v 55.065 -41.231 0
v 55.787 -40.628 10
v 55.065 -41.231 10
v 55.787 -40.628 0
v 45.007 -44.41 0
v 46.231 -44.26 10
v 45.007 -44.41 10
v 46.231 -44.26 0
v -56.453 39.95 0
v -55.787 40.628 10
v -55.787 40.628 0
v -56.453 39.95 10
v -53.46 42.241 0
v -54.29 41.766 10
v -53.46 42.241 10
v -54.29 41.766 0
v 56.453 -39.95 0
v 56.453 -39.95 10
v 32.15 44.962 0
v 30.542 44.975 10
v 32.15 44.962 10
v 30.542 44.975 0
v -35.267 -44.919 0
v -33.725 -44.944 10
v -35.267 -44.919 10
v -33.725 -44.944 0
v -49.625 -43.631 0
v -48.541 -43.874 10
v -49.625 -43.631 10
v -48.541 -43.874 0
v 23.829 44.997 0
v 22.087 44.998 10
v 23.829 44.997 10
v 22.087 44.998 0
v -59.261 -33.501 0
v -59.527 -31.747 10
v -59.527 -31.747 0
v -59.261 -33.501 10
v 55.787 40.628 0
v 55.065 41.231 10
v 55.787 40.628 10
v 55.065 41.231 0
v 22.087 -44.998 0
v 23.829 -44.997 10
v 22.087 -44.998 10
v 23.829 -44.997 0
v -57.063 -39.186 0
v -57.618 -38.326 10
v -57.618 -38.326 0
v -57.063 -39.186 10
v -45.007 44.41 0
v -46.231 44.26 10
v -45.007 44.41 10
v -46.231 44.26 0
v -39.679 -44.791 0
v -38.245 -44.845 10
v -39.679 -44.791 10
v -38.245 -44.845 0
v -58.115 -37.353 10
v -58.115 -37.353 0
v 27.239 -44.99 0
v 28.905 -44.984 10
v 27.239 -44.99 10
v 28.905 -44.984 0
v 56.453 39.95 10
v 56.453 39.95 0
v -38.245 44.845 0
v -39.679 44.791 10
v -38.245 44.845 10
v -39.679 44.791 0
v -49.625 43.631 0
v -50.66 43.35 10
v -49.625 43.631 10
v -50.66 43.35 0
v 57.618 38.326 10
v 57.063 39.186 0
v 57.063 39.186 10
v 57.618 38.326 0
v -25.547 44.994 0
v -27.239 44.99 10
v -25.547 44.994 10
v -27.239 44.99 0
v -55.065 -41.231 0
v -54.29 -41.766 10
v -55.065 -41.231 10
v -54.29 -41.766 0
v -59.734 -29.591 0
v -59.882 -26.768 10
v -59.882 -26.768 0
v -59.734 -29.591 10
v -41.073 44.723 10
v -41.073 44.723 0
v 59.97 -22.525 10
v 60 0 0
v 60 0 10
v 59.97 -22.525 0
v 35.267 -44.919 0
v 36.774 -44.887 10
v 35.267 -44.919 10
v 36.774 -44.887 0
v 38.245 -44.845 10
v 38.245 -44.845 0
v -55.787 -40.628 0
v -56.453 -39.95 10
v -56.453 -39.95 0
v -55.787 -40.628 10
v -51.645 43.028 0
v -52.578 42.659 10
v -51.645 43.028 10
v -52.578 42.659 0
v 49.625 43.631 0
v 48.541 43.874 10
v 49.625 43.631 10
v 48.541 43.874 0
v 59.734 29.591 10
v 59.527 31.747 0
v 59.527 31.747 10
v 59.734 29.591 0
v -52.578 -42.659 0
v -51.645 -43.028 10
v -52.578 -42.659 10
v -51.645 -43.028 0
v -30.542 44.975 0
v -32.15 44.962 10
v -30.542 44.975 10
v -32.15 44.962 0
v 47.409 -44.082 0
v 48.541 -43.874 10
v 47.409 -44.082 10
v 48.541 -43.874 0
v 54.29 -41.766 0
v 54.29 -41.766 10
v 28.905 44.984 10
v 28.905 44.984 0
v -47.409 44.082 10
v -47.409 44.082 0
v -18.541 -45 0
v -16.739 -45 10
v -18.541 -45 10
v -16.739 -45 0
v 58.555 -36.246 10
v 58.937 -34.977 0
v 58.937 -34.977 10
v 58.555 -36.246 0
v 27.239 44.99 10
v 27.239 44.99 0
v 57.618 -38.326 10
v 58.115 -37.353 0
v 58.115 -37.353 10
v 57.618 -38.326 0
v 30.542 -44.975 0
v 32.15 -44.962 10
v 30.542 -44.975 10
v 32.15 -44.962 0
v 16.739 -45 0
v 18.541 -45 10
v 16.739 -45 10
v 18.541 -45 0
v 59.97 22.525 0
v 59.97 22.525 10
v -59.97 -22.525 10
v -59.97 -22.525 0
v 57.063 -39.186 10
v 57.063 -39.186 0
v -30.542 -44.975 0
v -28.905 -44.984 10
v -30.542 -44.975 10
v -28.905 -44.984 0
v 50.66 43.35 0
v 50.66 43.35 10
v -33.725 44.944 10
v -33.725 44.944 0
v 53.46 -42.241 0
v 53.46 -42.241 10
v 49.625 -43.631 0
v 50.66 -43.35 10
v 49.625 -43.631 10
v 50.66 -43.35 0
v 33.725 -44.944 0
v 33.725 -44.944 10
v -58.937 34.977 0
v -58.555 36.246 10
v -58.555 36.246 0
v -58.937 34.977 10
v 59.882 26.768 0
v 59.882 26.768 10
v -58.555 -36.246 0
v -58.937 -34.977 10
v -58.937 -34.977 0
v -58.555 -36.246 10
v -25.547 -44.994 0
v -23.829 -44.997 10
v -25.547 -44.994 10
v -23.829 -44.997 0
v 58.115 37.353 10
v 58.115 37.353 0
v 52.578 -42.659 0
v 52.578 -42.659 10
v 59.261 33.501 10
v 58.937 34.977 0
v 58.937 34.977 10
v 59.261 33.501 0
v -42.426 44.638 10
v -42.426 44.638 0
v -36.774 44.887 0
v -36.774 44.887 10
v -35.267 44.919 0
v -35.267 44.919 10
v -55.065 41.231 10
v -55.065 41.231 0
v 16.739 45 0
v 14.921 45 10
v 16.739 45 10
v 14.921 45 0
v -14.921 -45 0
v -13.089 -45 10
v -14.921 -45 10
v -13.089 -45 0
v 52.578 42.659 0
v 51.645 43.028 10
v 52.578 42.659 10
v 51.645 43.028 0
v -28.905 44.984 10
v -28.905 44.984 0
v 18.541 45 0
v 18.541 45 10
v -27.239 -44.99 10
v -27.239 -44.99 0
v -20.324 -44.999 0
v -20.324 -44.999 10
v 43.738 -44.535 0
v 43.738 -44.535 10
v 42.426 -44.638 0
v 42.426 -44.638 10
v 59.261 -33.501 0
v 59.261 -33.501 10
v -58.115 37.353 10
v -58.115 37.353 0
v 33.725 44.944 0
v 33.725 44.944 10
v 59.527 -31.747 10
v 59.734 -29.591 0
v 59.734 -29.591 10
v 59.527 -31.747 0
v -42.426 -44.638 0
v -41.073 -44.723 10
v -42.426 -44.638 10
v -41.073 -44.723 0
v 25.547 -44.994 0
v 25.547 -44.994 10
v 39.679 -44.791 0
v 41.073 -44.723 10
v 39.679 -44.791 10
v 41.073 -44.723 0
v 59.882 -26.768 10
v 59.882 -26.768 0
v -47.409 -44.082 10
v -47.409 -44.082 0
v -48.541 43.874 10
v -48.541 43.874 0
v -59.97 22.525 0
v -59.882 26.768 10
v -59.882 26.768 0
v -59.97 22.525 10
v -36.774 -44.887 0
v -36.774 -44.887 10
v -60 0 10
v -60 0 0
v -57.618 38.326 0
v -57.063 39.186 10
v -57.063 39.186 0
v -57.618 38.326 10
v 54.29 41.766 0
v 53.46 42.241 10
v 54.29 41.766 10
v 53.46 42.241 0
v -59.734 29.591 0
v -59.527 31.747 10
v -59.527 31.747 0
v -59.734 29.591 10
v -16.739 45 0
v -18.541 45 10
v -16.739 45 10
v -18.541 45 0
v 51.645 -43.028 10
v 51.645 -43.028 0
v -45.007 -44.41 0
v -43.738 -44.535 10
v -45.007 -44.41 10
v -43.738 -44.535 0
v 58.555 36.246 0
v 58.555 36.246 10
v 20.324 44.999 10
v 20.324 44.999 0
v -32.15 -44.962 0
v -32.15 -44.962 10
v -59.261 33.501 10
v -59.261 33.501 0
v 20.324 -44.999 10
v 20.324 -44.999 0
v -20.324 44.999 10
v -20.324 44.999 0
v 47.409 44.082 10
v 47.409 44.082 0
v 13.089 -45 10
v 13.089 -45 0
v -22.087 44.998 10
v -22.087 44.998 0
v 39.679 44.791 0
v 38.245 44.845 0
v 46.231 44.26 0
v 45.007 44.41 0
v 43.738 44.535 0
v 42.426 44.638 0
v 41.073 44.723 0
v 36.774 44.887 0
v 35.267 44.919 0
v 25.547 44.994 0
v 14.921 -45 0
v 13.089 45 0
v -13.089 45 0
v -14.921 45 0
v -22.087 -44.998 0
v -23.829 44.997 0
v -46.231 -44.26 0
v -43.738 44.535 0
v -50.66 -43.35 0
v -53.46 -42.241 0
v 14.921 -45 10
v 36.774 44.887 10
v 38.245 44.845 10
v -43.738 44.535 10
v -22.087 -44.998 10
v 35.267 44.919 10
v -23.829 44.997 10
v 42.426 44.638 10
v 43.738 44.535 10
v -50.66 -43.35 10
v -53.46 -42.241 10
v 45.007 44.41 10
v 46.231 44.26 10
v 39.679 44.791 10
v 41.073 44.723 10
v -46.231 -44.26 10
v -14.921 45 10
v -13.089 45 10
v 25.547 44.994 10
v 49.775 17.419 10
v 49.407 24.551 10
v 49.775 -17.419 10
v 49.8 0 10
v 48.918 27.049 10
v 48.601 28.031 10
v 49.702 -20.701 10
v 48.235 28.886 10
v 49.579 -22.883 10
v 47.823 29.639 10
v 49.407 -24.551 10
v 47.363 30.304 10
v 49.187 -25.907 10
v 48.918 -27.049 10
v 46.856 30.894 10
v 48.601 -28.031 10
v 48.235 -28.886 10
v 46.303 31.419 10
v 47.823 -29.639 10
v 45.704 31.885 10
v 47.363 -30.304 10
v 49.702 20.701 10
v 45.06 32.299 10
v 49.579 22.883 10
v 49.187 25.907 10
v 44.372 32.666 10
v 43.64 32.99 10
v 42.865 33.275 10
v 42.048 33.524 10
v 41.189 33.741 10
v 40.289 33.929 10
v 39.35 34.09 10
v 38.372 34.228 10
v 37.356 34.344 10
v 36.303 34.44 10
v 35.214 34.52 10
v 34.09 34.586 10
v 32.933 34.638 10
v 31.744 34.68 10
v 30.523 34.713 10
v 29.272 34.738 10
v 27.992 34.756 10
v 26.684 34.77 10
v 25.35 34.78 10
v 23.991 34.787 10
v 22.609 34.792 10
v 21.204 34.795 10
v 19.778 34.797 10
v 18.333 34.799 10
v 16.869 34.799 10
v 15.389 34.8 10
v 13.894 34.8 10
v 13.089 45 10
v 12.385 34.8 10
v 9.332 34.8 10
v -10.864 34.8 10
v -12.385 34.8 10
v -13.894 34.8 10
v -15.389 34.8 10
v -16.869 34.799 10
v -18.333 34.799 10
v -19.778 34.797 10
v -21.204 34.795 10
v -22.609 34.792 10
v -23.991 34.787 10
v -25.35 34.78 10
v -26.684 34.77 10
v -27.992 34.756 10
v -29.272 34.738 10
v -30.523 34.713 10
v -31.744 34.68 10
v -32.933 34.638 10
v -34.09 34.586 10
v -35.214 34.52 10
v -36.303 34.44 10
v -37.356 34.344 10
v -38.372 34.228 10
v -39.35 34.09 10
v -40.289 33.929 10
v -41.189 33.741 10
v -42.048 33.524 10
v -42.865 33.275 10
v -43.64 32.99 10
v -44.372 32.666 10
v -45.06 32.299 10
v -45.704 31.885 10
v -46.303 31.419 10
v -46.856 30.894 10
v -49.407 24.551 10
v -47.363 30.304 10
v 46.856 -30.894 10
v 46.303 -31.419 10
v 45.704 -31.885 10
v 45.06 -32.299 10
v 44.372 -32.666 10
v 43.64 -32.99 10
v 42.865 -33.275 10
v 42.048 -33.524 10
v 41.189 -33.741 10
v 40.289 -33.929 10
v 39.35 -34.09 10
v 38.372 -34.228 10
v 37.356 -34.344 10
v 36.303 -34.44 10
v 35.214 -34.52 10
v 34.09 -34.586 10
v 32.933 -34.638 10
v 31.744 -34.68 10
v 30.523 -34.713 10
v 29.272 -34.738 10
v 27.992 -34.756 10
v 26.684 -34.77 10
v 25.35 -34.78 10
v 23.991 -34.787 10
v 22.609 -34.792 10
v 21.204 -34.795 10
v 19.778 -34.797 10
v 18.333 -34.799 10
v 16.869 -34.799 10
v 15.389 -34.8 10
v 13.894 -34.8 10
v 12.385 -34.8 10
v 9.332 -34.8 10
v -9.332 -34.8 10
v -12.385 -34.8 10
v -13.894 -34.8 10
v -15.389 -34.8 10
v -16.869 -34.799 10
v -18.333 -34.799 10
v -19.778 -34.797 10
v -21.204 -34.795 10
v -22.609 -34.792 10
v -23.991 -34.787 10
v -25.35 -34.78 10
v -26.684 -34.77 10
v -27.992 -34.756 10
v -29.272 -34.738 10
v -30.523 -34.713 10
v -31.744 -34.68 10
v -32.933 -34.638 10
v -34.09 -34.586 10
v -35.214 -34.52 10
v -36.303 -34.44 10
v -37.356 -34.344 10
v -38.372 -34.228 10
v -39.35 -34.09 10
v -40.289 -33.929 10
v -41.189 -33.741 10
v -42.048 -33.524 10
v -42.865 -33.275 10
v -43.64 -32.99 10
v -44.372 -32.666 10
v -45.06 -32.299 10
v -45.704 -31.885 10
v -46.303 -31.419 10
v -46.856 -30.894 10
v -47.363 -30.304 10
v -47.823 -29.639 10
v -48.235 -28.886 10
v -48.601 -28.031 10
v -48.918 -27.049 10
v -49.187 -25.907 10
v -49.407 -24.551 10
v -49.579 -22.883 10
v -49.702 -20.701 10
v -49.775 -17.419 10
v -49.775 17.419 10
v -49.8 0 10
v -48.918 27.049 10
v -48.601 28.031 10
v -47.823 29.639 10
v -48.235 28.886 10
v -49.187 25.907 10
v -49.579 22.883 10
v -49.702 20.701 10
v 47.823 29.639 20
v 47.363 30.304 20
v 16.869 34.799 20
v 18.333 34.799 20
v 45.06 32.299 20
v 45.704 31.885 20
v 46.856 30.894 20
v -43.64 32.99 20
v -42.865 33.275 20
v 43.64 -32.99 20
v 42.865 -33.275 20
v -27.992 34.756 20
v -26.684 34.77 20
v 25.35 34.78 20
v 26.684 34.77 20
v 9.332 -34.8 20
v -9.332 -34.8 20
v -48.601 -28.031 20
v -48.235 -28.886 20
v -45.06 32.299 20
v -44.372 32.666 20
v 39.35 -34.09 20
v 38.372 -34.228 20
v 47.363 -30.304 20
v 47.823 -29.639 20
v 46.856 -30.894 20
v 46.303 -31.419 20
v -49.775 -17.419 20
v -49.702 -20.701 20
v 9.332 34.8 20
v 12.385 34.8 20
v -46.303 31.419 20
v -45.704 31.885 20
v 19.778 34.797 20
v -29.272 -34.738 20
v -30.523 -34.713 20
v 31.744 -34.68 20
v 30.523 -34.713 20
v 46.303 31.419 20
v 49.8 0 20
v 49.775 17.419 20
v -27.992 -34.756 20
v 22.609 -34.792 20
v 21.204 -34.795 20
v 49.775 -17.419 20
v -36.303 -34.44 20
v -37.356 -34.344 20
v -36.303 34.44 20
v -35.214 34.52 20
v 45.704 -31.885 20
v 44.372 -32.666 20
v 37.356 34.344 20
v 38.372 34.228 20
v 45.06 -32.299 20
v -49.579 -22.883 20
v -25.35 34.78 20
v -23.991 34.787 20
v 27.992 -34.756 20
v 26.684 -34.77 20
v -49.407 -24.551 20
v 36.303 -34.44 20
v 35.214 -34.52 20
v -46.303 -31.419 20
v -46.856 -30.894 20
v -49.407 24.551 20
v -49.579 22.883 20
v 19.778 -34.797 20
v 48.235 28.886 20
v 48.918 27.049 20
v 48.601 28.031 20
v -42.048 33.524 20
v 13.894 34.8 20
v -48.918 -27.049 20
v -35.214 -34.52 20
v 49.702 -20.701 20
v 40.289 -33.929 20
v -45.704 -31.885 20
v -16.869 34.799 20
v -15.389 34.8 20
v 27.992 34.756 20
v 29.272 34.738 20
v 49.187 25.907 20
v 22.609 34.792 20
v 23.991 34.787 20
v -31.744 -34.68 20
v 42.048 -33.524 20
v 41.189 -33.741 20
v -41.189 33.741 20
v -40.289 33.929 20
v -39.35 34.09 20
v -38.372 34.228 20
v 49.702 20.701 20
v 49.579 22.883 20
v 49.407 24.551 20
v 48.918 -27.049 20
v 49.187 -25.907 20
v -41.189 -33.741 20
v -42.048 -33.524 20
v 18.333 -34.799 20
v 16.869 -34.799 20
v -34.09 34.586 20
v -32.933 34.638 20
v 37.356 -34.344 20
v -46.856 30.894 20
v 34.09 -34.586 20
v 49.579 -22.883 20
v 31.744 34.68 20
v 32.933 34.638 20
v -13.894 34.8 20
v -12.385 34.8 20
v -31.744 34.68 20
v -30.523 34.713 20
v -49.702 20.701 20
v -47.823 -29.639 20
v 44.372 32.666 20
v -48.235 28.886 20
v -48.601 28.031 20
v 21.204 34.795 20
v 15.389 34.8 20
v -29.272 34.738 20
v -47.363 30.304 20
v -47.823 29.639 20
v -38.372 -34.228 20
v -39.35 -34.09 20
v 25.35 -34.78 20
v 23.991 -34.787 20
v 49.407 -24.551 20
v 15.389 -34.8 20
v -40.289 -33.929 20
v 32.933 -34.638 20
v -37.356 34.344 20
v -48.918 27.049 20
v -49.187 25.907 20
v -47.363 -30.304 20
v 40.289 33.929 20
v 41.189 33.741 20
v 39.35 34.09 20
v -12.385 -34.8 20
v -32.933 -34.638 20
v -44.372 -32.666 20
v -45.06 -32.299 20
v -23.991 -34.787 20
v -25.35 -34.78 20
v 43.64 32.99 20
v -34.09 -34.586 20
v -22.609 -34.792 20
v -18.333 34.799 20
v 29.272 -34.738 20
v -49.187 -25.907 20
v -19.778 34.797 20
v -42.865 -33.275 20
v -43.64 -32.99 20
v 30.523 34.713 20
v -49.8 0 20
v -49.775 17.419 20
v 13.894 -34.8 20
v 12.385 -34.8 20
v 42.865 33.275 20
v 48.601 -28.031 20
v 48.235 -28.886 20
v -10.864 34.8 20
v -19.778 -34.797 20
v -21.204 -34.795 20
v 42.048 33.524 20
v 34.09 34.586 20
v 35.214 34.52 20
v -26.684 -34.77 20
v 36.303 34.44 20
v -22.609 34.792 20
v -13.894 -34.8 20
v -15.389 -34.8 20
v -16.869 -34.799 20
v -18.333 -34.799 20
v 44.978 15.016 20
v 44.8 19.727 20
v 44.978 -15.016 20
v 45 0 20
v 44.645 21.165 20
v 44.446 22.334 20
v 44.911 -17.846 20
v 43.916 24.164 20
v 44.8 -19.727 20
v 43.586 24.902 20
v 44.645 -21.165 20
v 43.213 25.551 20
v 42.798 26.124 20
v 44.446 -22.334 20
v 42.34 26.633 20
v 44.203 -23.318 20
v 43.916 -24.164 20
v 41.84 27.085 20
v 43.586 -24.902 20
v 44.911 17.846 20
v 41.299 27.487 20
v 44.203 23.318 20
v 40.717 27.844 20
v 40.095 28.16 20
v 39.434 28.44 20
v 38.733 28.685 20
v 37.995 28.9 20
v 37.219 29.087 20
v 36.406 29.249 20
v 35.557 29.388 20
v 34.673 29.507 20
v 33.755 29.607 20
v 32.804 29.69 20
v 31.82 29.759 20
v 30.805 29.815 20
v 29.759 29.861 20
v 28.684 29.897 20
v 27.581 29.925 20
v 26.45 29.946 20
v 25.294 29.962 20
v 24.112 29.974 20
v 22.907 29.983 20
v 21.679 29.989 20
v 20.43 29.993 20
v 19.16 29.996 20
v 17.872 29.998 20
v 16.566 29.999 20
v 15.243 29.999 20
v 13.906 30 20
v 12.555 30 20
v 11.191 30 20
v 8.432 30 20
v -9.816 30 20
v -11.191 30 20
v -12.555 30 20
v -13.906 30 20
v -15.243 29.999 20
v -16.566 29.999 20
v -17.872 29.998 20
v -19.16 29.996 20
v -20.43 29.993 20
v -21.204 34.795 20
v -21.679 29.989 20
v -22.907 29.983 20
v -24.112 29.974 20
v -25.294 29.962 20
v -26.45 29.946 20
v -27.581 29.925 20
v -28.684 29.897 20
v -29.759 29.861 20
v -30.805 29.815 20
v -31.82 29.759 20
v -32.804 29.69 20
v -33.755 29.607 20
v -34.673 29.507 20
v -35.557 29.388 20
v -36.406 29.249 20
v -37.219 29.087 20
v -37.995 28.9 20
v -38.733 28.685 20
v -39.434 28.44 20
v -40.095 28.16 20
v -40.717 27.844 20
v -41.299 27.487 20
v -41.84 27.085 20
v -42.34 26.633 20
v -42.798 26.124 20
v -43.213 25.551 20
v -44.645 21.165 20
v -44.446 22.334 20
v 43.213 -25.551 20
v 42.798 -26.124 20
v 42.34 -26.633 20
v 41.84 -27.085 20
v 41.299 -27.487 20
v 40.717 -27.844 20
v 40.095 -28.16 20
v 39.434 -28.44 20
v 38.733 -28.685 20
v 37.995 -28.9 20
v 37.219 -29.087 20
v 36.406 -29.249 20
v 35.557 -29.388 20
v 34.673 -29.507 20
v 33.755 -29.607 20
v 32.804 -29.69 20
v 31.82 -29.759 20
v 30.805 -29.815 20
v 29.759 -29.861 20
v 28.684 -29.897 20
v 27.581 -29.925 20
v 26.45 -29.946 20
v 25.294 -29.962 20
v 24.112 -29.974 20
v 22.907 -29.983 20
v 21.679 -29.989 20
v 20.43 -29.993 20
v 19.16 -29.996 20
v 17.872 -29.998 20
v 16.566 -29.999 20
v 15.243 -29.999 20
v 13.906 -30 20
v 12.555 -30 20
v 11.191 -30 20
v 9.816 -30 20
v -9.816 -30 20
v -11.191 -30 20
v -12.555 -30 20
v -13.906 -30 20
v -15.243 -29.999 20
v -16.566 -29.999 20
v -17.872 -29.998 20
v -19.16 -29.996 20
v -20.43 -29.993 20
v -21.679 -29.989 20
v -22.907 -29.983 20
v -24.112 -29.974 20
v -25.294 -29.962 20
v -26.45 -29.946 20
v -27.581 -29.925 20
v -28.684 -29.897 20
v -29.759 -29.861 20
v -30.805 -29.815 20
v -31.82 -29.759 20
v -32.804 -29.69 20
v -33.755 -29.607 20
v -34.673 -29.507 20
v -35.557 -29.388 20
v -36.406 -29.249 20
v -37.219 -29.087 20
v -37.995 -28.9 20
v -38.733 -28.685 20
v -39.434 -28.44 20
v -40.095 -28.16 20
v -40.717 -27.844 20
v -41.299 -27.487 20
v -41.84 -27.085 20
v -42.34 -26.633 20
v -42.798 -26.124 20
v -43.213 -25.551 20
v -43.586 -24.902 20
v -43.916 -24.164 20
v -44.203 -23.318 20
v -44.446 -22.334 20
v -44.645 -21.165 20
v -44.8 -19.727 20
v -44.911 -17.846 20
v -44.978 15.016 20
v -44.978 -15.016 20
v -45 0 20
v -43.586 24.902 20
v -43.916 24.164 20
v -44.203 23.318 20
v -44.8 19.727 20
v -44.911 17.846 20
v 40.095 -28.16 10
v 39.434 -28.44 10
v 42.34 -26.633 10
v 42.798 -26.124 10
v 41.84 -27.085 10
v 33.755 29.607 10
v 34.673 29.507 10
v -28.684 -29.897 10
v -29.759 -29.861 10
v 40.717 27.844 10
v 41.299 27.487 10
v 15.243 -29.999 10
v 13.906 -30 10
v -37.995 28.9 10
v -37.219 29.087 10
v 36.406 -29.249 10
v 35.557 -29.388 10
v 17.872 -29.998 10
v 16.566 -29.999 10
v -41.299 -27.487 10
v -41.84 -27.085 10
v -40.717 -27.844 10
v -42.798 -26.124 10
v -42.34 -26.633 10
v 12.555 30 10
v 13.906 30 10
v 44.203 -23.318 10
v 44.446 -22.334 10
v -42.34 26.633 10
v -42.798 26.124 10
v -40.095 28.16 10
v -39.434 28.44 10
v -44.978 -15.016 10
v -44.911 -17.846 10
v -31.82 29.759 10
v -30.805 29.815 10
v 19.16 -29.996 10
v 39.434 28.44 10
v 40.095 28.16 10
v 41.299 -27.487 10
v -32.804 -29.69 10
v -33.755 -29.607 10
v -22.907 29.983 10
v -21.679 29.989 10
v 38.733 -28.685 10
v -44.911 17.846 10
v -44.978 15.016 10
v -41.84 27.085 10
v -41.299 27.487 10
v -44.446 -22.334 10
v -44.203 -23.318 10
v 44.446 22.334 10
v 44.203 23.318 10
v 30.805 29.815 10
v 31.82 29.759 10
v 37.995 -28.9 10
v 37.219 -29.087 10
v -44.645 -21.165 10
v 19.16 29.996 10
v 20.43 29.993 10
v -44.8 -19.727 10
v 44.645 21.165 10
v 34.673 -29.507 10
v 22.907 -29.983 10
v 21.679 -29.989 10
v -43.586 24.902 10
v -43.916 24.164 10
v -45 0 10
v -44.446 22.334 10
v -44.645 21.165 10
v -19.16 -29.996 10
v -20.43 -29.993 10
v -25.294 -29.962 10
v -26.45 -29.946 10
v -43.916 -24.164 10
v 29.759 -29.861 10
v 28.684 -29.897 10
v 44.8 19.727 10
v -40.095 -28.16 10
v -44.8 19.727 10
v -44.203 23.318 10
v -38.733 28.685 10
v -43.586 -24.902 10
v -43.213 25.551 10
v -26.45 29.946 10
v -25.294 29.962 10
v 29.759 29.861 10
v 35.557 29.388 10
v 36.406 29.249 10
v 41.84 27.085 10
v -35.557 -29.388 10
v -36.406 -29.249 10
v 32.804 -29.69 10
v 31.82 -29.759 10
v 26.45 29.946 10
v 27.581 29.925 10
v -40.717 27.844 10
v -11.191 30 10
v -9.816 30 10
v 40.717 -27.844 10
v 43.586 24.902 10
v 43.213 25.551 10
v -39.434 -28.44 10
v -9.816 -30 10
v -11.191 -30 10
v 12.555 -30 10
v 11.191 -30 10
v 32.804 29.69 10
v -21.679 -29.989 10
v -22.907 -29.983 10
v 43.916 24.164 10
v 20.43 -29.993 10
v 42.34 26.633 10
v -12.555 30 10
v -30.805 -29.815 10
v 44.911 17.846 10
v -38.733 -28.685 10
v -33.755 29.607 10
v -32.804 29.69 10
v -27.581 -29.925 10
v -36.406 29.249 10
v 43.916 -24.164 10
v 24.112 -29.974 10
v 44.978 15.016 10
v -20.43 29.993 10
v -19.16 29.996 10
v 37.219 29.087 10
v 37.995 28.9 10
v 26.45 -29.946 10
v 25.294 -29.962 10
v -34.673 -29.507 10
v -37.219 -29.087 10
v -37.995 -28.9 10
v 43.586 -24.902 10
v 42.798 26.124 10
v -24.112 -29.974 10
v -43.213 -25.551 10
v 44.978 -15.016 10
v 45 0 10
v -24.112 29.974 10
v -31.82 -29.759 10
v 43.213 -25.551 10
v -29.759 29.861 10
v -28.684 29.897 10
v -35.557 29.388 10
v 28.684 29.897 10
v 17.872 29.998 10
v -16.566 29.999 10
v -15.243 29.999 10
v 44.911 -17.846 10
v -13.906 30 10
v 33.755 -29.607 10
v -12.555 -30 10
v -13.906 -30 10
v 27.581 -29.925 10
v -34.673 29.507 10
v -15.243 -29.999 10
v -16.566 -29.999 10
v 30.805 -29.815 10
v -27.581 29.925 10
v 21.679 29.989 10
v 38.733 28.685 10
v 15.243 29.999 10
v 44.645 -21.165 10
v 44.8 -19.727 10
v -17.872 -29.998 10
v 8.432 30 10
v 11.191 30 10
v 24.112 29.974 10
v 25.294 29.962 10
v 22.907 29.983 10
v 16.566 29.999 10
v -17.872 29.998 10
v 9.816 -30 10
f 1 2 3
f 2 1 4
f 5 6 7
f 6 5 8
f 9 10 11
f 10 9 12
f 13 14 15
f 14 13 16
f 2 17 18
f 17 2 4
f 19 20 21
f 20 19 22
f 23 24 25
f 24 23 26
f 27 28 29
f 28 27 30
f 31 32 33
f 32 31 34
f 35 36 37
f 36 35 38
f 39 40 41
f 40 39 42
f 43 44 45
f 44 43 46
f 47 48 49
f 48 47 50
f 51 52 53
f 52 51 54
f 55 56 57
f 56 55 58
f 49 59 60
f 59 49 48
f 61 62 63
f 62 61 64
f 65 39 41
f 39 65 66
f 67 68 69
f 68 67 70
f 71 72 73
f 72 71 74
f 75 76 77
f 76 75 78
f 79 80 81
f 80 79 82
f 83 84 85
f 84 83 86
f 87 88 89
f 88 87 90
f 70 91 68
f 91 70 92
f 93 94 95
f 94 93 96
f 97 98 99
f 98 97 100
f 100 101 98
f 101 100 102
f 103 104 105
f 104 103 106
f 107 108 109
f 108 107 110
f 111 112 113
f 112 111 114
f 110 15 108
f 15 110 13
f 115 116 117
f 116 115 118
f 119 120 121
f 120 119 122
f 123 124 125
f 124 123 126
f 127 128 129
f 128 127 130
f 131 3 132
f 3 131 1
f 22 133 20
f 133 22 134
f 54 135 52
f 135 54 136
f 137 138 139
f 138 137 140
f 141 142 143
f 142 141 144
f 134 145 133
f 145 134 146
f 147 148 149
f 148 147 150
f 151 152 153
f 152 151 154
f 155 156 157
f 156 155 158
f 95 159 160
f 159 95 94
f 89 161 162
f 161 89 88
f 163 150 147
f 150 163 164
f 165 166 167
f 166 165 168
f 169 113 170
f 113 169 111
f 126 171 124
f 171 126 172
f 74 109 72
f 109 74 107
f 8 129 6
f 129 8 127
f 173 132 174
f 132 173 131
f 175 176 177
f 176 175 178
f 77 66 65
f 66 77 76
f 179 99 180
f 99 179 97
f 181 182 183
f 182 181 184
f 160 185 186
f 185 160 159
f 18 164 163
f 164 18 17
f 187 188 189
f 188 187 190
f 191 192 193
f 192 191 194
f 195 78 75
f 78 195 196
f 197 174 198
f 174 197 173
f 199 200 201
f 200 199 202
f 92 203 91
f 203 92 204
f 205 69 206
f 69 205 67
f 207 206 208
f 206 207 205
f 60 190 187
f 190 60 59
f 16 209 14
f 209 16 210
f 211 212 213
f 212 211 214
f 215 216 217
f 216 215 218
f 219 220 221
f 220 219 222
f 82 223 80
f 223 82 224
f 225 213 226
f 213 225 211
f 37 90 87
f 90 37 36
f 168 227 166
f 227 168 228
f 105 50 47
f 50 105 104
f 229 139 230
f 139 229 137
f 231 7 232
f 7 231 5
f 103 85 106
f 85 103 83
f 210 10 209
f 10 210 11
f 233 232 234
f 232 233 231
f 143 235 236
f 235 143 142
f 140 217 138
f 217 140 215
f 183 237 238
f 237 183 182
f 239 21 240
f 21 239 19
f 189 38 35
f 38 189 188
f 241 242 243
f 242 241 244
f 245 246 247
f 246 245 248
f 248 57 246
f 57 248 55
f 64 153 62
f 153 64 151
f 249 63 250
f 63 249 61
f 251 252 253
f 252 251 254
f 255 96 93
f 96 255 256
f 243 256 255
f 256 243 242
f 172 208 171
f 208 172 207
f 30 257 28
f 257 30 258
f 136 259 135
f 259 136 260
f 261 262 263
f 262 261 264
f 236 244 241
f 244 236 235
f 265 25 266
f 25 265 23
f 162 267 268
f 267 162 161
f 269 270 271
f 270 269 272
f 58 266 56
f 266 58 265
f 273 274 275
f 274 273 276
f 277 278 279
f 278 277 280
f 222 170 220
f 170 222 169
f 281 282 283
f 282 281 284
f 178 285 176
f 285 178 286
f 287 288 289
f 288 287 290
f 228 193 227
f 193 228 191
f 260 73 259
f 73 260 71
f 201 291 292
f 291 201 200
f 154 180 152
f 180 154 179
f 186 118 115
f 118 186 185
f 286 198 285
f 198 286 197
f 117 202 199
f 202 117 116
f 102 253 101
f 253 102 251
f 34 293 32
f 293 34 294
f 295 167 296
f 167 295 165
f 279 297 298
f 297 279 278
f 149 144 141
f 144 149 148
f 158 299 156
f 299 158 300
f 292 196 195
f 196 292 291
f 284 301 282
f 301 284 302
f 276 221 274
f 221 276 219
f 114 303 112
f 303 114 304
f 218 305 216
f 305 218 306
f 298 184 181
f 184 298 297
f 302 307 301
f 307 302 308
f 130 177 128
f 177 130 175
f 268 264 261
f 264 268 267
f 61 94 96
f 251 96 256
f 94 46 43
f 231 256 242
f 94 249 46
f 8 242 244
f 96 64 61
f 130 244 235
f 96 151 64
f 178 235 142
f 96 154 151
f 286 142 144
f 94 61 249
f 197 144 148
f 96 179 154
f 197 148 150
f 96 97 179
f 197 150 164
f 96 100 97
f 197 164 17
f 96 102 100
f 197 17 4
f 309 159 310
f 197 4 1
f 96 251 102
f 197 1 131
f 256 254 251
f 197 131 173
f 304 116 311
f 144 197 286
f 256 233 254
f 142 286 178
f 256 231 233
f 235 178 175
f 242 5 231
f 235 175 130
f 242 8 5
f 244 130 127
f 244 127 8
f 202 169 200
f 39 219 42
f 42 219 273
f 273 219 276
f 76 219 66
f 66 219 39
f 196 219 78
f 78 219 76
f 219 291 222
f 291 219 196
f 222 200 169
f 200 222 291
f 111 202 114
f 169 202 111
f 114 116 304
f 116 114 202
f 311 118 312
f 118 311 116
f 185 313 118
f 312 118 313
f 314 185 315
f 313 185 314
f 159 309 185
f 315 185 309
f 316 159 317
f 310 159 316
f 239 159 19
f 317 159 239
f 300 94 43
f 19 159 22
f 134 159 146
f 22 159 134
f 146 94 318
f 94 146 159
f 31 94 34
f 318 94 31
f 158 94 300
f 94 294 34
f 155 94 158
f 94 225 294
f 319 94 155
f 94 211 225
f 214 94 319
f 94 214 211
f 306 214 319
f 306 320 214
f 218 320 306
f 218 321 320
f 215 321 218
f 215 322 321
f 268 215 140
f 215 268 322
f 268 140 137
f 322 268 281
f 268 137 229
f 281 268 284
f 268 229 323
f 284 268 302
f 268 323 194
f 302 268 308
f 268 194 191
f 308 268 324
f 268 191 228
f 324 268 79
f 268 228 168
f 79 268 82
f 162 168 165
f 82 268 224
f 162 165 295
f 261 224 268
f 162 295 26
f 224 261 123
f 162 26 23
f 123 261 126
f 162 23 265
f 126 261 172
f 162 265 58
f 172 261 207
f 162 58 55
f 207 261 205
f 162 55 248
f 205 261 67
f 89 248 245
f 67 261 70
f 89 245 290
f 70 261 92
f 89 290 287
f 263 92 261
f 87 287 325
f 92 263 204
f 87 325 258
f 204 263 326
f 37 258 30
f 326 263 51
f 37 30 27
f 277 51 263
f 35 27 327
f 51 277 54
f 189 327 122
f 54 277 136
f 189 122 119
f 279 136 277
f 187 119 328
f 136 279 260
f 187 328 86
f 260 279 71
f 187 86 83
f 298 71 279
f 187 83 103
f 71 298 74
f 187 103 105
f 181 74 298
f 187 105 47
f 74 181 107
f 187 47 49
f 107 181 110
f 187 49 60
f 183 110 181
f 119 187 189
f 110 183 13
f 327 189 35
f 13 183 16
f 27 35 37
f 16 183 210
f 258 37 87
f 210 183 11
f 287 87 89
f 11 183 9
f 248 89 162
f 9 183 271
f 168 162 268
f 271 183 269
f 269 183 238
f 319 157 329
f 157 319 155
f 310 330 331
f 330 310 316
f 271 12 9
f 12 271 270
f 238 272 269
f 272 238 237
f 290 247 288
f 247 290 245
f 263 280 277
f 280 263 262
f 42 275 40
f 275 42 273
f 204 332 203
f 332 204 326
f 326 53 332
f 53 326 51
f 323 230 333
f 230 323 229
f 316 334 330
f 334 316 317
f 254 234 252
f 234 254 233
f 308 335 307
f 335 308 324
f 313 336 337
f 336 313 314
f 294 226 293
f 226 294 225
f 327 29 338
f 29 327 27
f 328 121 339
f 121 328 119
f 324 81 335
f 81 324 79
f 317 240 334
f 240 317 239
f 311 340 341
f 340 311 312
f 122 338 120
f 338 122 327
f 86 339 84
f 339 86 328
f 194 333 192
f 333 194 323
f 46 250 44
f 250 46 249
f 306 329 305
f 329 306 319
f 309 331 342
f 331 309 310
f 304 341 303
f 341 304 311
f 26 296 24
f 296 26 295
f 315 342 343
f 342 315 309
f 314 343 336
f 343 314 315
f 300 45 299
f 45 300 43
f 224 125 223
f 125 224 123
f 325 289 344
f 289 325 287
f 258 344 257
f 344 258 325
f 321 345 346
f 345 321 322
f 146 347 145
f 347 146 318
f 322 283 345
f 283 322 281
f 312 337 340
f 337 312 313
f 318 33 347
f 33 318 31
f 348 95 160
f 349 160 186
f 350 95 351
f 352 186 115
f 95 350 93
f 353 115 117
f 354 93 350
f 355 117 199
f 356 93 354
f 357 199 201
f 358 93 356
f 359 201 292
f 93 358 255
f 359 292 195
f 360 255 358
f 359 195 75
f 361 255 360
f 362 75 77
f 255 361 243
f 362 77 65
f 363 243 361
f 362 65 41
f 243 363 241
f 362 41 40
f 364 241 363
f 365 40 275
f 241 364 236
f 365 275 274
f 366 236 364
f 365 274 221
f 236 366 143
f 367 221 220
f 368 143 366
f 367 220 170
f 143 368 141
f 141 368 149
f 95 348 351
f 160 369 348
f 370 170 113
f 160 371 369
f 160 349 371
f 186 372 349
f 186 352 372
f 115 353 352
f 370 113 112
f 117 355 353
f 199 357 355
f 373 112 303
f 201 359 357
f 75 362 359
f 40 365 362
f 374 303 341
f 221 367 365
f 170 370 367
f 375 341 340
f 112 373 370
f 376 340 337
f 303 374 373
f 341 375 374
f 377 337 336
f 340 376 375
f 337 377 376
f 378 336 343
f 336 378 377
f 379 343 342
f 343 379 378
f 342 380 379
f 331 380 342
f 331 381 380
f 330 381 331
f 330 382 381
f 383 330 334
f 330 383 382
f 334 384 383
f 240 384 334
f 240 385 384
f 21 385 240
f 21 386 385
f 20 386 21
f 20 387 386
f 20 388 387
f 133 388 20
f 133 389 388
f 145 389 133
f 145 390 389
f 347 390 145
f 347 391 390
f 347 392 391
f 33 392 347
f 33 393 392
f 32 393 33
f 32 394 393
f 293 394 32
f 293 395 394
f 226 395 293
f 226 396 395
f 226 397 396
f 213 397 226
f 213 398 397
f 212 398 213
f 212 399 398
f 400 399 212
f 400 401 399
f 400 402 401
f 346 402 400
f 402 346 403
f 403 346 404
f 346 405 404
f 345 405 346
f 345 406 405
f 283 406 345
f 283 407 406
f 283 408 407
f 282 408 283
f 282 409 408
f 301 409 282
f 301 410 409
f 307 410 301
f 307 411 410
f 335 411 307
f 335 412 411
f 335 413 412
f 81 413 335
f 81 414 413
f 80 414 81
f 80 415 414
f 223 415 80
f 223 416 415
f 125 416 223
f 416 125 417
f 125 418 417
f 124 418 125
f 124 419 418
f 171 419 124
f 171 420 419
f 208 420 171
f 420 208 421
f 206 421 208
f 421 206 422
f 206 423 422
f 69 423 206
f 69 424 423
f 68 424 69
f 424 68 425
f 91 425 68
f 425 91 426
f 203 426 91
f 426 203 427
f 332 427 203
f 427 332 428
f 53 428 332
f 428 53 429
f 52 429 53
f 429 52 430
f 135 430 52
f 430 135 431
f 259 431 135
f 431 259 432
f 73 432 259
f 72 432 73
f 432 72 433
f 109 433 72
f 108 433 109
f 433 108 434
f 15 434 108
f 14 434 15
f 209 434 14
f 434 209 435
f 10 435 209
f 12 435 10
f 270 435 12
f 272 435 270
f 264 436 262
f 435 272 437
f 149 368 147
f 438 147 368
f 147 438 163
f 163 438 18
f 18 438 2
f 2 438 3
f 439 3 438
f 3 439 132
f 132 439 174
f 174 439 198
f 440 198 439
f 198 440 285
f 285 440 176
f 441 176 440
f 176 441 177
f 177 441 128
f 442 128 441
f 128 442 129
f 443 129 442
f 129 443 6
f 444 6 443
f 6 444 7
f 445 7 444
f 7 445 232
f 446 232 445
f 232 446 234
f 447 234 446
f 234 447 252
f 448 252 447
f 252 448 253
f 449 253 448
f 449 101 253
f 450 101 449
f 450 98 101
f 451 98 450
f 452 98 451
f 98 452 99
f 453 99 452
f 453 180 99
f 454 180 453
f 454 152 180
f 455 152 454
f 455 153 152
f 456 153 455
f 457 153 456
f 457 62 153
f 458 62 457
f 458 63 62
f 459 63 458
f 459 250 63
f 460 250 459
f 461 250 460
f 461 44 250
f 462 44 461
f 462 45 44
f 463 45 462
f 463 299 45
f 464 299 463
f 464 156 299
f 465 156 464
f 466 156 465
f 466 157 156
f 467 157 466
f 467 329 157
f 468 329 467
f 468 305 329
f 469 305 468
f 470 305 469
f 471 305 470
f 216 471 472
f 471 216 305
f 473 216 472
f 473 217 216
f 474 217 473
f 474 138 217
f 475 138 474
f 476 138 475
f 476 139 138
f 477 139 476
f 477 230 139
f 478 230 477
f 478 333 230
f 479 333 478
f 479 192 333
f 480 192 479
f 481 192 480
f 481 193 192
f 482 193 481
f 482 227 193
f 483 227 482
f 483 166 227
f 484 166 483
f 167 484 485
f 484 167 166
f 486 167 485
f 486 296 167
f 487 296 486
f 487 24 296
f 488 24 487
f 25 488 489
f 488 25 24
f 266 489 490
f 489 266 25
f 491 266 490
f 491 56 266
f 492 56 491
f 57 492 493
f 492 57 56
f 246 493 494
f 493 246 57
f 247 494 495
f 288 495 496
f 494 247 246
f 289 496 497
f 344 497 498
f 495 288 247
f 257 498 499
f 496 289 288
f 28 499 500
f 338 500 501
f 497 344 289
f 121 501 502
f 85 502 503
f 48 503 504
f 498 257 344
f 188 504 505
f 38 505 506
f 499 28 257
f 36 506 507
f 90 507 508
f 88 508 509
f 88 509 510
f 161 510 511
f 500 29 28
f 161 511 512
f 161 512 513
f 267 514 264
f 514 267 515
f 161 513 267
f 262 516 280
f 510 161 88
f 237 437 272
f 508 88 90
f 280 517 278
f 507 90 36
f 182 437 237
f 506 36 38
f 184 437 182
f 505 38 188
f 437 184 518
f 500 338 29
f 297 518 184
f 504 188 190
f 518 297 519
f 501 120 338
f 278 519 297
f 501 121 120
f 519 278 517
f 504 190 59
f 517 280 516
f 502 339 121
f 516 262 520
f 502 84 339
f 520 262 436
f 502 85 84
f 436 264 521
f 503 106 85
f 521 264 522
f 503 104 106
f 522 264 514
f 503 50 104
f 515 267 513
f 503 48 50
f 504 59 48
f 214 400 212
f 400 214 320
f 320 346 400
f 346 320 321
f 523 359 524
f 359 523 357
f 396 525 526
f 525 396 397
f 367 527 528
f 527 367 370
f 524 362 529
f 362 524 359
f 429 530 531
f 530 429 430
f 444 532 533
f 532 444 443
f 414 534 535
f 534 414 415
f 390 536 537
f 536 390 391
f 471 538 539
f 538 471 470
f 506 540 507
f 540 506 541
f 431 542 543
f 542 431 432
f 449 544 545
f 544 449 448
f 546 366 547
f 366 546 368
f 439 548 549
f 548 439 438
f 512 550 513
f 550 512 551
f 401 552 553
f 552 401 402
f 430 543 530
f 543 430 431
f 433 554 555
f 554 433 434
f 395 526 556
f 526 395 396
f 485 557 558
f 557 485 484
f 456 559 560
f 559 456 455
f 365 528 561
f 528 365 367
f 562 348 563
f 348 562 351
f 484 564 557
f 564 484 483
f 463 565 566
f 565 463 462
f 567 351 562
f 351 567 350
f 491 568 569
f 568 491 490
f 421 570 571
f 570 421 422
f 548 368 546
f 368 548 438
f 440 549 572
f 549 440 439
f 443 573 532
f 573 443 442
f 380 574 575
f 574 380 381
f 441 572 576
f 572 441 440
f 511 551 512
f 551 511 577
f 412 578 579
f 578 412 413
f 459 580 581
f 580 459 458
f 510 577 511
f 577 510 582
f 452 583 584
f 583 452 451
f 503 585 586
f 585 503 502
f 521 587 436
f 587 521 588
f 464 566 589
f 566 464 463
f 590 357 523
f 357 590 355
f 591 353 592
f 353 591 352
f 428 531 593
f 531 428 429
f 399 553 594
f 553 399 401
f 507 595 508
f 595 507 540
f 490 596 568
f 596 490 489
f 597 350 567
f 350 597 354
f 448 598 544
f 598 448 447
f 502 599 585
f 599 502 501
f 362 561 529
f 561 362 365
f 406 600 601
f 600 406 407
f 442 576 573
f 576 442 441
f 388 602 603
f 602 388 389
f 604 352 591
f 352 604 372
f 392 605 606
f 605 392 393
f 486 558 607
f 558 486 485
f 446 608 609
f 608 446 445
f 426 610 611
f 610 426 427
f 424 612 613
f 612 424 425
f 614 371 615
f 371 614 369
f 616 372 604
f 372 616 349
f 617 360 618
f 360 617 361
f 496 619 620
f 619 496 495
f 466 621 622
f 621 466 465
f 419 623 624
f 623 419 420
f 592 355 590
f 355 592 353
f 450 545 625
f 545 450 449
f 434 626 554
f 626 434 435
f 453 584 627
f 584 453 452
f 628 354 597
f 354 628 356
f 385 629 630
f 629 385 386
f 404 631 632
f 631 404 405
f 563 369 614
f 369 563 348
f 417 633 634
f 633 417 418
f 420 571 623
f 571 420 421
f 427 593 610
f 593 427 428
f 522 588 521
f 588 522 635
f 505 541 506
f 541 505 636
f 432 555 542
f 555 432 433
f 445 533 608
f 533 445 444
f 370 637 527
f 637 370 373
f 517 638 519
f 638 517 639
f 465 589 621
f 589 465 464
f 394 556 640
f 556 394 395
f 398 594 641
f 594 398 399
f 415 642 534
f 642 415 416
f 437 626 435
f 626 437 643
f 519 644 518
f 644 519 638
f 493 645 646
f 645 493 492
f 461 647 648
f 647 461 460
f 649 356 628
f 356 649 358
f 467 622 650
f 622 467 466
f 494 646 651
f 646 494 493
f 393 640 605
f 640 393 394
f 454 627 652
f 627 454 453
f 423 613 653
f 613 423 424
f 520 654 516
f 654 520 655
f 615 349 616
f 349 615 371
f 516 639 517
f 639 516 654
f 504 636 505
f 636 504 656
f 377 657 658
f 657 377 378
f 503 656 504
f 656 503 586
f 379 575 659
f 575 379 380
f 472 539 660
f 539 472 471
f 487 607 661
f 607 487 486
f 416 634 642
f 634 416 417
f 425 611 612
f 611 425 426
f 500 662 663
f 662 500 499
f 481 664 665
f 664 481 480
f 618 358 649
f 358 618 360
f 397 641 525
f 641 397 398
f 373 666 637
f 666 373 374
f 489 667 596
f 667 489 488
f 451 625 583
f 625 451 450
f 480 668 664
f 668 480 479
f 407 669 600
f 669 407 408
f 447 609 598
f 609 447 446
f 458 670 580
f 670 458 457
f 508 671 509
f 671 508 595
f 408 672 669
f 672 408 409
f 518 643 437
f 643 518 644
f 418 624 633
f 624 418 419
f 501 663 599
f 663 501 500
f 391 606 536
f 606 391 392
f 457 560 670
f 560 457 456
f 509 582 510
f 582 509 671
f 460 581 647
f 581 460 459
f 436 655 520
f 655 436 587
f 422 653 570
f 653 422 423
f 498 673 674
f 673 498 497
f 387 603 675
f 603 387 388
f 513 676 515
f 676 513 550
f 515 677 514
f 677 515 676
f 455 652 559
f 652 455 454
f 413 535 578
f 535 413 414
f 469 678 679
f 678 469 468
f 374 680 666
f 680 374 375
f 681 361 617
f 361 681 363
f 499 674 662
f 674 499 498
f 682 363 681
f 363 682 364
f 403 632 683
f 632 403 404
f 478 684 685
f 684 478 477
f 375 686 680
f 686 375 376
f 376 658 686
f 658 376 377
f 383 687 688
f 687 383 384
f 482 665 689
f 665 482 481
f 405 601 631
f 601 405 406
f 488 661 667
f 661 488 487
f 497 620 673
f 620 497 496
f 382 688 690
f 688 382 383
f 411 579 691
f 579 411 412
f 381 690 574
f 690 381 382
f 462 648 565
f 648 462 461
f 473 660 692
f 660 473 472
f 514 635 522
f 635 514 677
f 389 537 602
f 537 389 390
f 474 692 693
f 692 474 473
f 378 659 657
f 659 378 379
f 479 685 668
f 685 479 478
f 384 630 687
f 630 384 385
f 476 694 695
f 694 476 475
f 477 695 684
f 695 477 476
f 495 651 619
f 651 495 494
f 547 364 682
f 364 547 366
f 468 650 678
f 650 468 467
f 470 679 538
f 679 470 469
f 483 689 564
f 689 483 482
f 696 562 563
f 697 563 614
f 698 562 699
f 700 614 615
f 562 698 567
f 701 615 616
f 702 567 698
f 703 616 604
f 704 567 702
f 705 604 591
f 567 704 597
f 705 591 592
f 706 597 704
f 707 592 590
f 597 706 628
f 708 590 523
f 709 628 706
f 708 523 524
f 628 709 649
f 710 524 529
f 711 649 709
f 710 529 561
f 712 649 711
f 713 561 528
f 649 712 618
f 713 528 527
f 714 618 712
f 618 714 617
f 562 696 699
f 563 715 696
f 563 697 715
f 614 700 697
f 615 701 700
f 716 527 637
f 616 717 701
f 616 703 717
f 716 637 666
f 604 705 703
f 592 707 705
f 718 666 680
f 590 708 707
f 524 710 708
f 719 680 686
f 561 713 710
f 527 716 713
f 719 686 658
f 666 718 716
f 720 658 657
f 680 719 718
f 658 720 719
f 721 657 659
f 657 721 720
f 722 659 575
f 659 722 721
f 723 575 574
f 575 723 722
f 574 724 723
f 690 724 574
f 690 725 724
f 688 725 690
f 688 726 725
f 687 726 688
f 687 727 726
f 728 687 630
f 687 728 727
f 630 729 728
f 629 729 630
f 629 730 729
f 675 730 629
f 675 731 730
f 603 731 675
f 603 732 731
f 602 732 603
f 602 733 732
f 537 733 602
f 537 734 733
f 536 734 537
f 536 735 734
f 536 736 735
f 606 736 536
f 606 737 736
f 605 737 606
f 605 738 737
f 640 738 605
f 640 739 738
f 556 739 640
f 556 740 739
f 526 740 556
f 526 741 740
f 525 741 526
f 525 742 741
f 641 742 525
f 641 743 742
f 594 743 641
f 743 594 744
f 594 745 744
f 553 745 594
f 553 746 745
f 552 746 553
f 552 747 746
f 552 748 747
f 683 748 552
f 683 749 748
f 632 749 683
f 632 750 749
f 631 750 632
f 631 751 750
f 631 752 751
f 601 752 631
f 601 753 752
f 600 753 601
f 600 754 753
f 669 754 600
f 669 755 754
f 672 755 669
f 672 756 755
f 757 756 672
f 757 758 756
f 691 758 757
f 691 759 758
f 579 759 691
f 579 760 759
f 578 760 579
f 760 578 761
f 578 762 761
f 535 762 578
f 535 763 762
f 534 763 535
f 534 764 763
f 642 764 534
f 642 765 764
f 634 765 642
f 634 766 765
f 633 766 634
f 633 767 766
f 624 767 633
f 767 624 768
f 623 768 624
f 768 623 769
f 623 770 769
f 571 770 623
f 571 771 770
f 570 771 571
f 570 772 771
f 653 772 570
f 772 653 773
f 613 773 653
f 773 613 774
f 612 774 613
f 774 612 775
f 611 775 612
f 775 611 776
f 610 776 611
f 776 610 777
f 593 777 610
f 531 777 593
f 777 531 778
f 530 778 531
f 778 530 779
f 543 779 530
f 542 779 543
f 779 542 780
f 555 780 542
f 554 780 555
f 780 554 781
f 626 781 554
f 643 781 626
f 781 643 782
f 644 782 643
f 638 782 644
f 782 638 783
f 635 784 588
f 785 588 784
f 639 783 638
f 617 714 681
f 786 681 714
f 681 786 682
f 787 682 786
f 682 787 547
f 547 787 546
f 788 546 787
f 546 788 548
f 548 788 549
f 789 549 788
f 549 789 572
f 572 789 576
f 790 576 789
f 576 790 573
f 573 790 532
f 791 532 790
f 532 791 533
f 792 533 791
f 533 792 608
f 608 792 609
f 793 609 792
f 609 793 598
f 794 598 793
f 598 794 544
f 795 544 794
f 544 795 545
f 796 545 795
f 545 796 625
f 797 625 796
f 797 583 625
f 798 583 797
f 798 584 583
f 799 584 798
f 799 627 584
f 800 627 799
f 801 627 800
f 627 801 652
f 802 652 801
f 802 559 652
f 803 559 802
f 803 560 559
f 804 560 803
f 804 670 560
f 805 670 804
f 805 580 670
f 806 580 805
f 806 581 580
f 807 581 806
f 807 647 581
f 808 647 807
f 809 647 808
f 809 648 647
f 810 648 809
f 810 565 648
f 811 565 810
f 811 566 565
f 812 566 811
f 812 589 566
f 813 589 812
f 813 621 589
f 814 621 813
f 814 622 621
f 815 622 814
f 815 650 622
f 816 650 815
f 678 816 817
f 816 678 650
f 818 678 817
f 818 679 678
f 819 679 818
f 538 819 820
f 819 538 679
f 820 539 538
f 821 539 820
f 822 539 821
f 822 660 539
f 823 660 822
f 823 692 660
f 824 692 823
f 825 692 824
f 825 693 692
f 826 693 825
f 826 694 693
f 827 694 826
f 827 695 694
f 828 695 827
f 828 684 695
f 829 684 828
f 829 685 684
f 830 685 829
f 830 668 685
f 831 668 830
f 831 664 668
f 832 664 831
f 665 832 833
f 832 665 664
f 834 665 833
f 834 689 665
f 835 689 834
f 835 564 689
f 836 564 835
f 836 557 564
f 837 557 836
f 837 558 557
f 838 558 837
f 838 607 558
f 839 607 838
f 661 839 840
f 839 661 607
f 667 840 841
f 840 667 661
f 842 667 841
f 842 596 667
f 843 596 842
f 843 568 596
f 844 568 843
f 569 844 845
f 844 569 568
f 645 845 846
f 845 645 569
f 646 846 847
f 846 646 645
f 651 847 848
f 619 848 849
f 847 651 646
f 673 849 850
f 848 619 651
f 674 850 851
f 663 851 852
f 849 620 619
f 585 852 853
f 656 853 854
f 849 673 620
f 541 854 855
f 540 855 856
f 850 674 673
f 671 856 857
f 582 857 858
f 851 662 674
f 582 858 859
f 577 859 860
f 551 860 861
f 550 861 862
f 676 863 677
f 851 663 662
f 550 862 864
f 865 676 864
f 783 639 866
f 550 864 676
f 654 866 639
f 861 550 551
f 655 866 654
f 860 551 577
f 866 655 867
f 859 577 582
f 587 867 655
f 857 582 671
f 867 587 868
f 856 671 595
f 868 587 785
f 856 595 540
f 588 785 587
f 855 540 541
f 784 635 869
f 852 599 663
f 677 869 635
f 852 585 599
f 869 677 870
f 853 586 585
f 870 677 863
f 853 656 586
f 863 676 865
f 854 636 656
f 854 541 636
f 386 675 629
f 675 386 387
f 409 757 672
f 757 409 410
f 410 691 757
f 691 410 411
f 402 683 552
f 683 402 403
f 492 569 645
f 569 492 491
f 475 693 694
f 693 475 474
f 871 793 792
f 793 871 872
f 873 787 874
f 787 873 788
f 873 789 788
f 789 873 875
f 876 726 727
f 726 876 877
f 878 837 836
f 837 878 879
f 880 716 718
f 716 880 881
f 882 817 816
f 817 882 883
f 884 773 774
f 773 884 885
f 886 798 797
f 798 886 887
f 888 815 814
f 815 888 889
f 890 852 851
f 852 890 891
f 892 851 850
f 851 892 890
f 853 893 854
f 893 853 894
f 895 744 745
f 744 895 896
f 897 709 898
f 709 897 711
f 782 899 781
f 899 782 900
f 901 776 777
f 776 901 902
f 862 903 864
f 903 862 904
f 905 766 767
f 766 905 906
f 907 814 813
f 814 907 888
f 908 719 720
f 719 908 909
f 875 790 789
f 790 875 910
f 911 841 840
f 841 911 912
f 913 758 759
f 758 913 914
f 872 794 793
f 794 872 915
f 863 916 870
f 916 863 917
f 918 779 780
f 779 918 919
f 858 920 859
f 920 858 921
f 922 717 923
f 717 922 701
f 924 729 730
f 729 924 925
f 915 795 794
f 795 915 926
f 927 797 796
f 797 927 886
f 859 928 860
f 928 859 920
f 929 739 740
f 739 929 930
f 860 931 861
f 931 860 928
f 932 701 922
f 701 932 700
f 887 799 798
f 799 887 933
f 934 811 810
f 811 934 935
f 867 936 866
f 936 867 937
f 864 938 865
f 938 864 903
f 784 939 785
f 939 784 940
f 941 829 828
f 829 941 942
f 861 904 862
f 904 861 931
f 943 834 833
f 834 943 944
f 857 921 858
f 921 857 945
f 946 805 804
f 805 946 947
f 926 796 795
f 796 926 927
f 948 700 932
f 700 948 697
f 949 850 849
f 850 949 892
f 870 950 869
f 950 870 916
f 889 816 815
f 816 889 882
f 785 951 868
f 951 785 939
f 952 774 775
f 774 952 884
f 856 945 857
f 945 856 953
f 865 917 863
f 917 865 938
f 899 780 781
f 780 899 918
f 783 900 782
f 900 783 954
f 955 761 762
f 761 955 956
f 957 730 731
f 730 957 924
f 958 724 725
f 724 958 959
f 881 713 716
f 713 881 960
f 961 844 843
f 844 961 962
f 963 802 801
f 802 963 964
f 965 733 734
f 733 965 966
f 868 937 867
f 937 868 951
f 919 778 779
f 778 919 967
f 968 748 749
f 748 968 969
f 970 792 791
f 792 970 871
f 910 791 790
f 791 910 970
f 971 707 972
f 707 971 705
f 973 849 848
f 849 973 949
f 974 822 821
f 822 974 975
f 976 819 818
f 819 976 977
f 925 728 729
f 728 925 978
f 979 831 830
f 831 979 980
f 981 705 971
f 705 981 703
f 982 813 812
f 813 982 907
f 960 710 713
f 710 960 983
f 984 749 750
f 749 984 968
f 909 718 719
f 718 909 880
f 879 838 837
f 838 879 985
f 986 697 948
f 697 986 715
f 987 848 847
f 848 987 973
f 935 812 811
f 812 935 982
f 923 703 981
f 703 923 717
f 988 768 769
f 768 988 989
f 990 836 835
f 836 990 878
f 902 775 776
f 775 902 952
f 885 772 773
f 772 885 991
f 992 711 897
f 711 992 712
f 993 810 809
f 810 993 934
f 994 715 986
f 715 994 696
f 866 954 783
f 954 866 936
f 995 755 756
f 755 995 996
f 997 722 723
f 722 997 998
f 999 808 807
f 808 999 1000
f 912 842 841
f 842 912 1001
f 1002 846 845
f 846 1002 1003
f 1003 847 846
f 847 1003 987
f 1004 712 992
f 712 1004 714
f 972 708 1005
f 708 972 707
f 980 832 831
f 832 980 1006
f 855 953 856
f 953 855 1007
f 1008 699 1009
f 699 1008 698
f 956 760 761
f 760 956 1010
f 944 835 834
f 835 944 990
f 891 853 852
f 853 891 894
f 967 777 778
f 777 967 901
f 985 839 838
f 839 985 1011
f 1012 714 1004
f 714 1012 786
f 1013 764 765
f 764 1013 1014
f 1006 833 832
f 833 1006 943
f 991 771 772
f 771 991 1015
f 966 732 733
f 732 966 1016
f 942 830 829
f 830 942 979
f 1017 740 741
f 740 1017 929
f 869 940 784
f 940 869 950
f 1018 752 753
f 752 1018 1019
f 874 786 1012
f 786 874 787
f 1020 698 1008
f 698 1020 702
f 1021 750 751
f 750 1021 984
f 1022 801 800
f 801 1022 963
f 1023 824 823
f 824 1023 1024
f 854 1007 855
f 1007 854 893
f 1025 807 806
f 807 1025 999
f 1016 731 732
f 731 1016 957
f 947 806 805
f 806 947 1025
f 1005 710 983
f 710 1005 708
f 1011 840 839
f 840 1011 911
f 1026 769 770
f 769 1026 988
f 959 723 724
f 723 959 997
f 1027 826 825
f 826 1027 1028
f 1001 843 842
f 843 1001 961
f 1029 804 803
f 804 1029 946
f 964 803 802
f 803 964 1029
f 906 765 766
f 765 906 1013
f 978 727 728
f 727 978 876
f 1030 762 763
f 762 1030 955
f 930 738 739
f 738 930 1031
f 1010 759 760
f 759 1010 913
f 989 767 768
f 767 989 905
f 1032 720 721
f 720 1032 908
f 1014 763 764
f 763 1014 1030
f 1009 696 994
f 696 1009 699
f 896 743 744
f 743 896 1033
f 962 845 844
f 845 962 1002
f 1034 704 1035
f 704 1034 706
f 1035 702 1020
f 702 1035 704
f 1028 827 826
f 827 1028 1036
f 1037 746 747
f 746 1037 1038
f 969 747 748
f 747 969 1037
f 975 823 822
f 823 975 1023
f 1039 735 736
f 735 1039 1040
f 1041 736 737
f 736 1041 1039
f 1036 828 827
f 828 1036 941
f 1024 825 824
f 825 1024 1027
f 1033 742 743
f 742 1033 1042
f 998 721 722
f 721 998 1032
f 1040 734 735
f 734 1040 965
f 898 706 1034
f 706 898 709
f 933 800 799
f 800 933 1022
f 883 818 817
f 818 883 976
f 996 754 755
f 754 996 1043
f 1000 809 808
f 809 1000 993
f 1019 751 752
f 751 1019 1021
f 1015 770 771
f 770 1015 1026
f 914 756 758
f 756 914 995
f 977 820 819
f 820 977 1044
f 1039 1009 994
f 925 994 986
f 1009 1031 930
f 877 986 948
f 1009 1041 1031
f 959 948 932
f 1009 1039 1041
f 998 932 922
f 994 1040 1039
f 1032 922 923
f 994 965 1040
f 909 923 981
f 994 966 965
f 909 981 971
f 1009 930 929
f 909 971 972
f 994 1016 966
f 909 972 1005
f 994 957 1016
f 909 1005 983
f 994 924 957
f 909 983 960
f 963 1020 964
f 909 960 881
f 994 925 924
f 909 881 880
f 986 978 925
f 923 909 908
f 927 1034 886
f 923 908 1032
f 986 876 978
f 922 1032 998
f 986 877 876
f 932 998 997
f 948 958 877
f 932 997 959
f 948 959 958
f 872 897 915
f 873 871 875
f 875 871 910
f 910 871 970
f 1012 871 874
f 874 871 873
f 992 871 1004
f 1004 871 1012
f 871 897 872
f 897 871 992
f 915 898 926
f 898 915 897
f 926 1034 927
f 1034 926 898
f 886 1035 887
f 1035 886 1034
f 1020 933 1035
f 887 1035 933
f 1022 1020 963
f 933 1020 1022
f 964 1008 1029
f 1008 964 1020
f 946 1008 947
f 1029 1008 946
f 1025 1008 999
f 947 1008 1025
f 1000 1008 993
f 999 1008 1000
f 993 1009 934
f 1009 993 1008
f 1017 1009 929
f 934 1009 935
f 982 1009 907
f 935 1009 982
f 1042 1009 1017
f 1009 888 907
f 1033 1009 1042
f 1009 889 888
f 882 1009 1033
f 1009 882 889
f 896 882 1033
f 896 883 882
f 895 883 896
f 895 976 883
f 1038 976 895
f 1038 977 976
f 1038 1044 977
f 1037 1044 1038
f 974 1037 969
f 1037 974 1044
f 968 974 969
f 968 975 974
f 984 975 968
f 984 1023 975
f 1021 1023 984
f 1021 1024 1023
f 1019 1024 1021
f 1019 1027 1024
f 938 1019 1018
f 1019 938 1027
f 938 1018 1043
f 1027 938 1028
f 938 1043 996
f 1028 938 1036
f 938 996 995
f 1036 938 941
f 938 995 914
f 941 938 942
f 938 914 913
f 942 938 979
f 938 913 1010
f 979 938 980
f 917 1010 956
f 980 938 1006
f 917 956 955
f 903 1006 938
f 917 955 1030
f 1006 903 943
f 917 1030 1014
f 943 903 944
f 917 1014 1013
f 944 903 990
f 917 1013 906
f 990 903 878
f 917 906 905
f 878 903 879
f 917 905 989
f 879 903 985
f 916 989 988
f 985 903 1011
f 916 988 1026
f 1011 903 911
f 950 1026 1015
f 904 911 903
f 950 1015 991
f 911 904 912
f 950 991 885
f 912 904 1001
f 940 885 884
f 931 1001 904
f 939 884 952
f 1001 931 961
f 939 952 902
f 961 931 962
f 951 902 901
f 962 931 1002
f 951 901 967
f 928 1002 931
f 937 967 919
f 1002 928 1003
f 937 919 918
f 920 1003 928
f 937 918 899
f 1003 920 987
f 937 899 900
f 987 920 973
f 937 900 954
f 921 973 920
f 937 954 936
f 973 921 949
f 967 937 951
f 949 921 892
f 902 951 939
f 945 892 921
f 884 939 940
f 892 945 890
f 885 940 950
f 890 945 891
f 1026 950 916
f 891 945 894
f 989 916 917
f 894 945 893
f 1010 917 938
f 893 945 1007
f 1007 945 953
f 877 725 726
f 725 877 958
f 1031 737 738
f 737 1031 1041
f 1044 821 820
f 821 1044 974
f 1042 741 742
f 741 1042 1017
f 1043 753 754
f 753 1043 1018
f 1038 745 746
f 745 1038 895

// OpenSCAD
// file: ../../functions/reverse.scad
function reverse(lst) =
  let(max = len(lst) - 1) [for(idx = [0 : max]) lst[max - idx]];
// file: ../../modules/superellipse.scad
use <../functions/reverse.scad>

module superellipse(ra = 1, rb = 1, n = 3) {
  inv_n = 1 / n;
  step = 90 / $fn * 4;

  pos_quadrant_pts = [
    for(angle = [0 : step : 90])
      let(x = sin(angle) * ra, y = rb * (1 - (x / ra) ^ n) ^ inv_n) [x, y]
  ];

  rev_pos_quadrant_pts = reverse(pos_quadrant_pts);

  polygon(points = [
    each rev_pos_quadrant_pts,
    for(p = pos_quadrant_pts) [-p.x, p.y],
    for(p = rev_pos_quadrant_pts) [-p.x, -p.y],
    for(p = pos_quadrant_pts) [p.x, -p.y]
  ]);
}
// main file
use <../../modules/superellipse.scad>

$fn = 200;

difference() {
  union() {
    linear_extrude(10) superellipse(ra = 120 / 2, rb = 90 / 2, n = 8);
    translate([0, 0, 10]) linear_extrude(10) superellipse(ra = (100 - 0.4) / 2, rb = (70 - 0.4) / 2, n = 8);
  }

  translate([0, 0, 10]) linear_extrude(11) superellipse(ra = (100 - 10) / 2, rb = (70 - 10) / 2, n = 8);
}
